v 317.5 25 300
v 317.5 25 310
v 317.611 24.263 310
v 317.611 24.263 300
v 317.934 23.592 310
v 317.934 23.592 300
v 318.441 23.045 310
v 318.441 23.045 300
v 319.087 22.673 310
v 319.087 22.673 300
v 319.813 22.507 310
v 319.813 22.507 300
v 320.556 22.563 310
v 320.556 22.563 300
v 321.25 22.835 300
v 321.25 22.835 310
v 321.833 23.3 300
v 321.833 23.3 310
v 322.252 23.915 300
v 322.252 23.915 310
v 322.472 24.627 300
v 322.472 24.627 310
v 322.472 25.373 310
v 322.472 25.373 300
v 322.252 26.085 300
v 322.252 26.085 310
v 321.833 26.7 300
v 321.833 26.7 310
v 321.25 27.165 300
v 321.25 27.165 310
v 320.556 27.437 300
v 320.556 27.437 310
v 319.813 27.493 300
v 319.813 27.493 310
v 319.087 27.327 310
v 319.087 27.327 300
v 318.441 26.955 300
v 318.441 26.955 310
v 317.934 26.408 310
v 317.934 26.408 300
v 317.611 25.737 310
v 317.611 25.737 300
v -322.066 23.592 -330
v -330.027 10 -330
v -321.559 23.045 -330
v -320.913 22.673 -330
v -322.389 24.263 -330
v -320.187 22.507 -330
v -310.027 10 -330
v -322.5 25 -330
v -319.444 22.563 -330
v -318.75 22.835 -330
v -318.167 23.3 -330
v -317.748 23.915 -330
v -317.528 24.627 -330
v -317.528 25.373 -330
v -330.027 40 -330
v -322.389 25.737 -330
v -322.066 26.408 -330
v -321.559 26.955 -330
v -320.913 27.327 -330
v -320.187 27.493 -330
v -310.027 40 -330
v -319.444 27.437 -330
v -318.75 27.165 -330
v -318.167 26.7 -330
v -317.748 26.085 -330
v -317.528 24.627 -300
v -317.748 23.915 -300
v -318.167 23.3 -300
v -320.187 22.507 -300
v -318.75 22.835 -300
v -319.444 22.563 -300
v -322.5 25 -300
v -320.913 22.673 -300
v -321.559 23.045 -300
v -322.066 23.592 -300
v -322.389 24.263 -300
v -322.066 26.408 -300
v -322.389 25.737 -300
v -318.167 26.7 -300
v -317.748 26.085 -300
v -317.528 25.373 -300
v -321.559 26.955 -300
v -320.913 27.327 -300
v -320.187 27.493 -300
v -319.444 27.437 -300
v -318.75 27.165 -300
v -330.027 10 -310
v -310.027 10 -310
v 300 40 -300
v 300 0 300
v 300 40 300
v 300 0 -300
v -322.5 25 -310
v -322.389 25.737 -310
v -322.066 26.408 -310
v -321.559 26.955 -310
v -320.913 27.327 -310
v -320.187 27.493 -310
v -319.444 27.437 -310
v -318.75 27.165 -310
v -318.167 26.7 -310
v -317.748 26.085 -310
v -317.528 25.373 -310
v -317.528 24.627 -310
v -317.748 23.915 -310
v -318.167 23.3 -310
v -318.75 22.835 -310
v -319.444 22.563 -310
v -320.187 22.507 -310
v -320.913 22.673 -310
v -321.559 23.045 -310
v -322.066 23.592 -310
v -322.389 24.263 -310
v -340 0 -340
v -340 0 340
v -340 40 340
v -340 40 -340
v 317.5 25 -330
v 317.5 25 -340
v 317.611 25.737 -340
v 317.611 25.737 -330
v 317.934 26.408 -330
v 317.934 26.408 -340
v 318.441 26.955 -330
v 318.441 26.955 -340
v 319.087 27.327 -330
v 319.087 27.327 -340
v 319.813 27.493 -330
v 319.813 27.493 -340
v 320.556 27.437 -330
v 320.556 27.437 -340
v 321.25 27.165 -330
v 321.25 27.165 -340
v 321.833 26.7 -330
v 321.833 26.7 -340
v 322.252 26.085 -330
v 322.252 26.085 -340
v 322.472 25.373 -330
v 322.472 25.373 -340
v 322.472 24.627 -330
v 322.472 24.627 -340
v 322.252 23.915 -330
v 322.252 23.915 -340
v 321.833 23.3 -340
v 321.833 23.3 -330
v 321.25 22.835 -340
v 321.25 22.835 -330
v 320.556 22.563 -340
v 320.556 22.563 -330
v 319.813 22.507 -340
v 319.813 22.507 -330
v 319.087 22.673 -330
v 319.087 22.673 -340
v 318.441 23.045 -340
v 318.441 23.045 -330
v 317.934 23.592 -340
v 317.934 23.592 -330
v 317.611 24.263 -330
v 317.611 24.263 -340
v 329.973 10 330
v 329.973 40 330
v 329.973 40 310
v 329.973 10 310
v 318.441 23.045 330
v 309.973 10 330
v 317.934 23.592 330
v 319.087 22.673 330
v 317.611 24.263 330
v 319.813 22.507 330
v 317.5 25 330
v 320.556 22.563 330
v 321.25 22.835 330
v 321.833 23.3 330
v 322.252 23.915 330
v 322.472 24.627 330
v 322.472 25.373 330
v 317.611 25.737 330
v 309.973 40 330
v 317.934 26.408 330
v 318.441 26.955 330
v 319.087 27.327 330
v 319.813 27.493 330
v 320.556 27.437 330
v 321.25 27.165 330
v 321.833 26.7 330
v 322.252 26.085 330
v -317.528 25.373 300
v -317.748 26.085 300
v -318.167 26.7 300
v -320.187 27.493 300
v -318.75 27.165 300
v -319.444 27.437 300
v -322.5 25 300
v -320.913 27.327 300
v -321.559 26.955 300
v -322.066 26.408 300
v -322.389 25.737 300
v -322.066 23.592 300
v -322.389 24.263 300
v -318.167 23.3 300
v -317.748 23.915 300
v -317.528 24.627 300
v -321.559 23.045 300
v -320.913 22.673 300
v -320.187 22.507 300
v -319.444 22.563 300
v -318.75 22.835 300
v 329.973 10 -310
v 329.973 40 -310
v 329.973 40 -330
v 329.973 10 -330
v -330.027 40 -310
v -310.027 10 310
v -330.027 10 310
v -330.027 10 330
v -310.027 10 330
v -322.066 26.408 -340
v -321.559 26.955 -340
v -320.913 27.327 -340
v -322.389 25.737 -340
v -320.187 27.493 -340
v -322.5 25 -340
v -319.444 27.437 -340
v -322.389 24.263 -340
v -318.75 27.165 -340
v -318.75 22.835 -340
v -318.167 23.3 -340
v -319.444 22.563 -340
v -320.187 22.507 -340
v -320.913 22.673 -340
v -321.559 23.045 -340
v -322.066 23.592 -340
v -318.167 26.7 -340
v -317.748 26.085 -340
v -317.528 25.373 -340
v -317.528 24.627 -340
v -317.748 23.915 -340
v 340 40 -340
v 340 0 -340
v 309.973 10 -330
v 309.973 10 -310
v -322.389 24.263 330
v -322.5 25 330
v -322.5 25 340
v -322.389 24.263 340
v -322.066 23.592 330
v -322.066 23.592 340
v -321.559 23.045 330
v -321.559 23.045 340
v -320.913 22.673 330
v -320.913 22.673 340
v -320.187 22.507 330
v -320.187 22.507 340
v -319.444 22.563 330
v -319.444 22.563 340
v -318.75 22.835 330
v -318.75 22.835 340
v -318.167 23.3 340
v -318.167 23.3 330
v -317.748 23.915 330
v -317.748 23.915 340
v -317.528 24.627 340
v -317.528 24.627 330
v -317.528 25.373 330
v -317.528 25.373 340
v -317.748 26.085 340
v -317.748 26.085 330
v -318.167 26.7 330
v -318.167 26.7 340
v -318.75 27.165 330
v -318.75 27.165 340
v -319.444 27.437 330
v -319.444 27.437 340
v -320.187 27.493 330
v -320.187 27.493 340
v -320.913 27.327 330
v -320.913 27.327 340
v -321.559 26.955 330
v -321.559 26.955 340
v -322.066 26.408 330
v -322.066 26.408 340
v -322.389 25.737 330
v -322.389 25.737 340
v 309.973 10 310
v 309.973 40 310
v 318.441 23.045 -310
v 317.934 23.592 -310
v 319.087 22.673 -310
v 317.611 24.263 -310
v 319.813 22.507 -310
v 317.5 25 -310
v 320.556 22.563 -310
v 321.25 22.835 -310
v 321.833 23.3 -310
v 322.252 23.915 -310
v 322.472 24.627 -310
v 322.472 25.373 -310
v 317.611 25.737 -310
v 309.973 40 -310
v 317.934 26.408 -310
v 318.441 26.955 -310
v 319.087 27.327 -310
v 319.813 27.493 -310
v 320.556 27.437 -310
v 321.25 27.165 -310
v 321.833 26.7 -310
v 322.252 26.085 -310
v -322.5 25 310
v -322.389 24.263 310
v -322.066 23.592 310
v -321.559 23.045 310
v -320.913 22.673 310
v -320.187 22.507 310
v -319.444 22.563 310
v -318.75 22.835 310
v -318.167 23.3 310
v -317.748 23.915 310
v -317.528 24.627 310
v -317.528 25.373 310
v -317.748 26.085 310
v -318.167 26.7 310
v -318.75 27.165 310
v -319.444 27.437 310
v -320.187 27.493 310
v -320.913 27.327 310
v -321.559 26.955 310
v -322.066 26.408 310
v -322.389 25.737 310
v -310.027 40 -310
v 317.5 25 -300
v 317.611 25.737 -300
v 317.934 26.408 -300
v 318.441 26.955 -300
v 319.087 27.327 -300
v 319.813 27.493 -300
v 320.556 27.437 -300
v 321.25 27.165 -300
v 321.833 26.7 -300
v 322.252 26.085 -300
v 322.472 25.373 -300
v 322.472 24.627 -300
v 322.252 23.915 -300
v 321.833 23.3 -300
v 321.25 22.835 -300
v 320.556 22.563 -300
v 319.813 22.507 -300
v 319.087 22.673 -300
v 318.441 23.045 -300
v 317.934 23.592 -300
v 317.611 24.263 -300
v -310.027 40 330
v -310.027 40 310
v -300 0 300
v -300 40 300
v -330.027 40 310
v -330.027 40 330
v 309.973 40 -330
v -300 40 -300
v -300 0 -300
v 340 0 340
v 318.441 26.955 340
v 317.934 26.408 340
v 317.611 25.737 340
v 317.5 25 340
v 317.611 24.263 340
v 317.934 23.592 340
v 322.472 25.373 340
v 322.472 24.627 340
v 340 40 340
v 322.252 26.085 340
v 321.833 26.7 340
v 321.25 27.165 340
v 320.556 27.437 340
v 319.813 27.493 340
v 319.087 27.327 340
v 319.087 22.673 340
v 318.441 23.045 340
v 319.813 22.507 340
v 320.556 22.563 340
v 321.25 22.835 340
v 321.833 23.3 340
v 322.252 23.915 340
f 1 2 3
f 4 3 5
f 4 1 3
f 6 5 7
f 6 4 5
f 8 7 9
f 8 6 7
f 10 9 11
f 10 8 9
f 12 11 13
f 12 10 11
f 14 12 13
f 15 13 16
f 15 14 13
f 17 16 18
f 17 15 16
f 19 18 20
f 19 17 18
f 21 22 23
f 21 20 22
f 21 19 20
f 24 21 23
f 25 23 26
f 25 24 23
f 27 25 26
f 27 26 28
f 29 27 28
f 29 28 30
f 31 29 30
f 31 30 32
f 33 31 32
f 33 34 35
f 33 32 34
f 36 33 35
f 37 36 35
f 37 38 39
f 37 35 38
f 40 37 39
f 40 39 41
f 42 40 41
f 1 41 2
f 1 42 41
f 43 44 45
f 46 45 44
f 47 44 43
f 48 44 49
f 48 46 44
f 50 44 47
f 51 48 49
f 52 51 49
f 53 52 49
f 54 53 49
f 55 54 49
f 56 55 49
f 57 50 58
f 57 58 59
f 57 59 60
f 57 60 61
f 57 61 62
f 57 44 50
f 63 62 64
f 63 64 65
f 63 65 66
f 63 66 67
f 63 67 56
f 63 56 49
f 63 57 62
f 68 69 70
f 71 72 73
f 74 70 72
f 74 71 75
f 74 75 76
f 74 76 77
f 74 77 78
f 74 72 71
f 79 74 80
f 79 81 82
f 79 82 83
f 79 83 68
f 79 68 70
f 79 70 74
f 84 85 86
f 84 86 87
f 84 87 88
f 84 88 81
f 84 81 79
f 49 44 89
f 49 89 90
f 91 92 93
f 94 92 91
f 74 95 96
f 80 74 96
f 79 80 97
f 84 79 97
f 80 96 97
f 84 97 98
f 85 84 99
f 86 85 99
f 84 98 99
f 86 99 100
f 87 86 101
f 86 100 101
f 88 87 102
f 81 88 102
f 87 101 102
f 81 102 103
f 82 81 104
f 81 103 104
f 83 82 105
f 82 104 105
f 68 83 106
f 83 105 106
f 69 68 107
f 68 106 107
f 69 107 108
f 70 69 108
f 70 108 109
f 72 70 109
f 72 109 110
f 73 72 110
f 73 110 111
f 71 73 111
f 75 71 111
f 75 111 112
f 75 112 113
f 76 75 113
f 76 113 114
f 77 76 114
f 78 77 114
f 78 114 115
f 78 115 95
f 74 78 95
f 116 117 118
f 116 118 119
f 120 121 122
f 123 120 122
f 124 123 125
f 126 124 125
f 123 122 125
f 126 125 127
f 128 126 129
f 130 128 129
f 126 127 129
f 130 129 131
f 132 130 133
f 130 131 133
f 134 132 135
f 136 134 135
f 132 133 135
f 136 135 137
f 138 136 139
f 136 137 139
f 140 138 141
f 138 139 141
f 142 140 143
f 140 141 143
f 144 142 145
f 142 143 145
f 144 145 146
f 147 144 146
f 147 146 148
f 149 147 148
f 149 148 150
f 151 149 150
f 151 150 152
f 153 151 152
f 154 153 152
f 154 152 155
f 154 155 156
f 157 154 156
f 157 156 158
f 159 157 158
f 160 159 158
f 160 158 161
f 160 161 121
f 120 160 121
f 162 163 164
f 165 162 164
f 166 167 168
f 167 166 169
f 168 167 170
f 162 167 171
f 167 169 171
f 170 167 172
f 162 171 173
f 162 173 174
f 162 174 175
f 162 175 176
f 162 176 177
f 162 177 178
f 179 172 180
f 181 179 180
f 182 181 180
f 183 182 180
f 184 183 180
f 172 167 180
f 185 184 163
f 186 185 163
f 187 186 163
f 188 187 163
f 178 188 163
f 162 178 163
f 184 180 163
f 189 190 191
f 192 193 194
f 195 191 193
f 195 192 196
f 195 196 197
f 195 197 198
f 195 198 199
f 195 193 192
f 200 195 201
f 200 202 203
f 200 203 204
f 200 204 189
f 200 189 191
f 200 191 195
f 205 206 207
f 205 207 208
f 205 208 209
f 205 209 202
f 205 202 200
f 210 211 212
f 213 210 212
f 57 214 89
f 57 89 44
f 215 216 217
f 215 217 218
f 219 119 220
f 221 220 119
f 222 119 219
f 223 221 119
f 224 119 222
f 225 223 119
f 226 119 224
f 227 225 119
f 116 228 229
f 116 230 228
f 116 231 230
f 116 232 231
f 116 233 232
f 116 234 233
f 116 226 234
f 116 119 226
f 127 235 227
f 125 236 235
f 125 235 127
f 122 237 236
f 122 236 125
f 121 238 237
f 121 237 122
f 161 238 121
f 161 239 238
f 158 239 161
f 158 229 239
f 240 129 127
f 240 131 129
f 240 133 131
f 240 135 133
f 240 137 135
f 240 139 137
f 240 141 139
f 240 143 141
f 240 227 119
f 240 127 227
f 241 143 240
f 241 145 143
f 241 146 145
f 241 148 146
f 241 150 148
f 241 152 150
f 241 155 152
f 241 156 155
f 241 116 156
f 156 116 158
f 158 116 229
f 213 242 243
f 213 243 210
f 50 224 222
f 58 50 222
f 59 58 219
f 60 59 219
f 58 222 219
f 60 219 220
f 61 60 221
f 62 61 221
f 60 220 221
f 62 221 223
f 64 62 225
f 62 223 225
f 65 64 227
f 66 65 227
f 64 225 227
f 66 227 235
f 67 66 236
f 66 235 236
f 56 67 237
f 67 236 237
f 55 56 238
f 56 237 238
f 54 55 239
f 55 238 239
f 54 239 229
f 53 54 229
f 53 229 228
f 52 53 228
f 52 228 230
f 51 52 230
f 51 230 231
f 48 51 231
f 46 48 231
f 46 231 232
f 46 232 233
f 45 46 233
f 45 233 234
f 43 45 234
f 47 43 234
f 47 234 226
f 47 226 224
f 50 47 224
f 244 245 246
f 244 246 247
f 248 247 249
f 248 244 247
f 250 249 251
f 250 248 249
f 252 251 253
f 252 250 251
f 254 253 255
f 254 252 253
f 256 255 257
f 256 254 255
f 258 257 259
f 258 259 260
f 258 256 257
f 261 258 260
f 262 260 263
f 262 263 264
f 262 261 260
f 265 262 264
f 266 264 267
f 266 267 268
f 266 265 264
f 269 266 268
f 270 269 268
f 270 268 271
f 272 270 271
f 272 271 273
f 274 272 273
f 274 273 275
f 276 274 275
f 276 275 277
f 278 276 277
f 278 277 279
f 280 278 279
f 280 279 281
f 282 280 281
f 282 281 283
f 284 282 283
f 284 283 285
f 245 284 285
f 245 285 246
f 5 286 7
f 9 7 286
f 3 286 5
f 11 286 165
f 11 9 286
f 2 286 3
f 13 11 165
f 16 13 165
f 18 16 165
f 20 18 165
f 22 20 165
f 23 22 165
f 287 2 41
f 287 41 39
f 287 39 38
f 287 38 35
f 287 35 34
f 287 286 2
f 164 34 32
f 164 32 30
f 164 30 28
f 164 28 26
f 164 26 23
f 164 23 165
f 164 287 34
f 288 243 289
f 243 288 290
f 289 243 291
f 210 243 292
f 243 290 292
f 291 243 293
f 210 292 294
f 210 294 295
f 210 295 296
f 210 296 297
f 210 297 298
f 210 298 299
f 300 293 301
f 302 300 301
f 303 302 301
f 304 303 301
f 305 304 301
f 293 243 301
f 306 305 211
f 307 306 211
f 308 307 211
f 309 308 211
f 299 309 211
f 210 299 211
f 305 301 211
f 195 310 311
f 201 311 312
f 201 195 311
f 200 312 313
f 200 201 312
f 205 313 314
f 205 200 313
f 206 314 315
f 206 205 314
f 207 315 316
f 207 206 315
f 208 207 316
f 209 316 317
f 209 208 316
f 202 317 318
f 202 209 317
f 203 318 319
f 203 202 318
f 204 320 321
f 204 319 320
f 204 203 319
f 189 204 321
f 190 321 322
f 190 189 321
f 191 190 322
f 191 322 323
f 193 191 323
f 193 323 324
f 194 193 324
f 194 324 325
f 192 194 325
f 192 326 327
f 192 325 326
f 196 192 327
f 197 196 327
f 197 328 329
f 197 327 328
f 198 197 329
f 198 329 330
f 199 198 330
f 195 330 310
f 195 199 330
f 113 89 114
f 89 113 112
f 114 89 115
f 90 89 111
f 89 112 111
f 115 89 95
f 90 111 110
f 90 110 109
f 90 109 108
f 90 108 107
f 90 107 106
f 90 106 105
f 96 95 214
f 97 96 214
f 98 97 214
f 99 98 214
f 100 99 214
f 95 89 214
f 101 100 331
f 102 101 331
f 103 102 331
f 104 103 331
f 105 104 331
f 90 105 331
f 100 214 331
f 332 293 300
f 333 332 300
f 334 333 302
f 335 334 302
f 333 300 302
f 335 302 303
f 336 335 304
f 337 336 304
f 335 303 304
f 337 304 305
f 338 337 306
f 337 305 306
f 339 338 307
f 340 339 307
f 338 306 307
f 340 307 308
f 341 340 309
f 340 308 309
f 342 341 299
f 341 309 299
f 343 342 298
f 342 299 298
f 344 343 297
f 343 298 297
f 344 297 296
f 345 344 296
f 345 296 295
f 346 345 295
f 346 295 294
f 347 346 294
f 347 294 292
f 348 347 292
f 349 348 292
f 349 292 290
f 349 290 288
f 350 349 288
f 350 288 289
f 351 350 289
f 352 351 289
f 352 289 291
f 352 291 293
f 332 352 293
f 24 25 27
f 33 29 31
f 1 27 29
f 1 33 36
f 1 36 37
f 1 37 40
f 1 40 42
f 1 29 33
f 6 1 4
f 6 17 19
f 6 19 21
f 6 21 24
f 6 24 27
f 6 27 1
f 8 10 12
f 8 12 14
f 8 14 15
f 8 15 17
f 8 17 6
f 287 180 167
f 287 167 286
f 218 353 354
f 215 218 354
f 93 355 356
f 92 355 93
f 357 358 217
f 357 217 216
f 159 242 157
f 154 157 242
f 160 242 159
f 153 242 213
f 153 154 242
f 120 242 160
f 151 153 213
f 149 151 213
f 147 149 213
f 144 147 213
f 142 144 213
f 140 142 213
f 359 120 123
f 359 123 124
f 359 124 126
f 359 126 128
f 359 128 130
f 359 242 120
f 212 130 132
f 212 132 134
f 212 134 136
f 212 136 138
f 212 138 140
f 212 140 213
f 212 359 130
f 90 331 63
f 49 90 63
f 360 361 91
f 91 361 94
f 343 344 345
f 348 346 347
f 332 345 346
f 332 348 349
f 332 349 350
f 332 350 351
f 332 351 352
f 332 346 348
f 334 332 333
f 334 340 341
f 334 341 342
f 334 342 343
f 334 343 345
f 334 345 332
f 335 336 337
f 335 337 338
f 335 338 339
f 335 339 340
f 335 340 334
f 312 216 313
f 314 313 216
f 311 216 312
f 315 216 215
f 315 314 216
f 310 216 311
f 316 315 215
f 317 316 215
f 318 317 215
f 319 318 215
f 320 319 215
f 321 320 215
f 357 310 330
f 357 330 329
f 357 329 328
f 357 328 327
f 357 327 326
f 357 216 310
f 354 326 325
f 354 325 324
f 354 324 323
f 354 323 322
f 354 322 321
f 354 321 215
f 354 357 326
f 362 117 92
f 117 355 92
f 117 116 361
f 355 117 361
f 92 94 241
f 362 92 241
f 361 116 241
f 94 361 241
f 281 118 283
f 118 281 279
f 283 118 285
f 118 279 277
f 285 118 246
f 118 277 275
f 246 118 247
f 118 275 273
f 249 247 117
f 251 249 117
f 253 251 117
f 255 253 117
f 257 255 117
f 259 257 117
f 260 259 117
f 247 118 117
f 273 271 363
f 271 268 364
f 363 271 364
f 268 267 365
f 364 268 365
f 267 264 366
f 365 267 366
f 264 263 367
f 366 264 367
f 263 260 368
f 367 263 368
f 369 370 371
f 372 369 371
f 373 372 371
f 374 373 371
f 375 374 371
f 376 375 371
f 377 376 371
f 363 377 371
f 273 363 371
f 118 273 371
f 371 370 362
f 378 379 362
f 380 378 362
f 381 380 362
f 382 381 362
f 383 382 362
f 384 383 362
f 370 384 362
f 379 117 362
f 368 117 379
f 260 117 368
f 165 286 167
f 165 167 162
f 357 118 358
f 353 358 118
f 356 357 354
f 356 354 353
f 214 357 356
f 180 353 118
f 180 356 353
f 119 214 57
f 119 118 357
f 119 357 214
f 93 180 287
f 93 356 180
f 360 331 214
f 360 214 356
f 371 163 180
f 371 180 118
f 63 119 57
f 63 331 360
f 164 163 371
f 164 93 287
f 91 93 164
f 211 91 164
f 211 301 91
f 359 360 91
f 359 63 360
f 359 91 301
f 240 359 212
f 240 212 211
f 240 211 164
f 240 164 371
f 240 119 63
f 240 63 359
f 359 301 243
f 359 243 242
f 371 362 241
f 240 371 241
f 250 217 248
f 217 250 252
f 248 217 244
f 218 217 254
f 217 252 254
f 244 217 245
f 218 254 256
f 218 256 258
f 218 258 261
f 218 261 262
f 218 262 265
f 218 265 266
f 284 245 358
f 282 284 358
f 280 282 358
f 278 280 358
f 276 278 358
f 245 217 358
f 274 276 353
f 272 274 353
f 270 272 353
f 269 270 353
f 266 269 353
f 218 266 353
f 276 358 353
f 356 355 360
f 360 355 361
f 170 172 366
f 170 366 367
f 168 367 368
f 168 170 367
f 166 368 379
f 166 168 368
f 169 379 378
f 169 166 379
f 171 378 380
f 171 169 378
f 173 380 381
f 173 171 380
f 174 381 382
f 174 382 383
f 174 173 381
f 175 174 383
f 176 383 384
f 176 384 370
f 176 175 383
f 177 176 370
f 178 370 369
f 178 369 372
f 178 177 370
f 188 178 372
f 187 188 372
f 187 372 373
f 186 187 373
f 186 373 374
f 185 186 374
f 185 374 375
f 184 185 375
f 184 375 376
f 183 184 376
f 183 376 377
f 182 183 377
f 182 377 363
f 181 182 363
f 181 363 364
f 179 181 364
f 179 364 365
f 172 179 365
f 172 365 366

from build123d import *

# Parameters (mm, degrees)
SKETCH1_W           = 680
SKETCH1_H           = 680
SKETCH1_W_2         = 600
SKETCH1_H_2         = 600
BOSS_EXTRUDE1_DEPTH = 40
SKETCH2_W           = 20
SKETCH2_H           = 20
CUT_EXTRUDE2_DEPTH  = 30
SKETCH3_R           = 2.5
CUT_EXTRUDE3_DEPTH  = 40
CUT_EXTRUDE4_START  = -40
SKETCH4_R           = 2.5
CUT_EXTRUDE4_DEPTH  = 40


with BuildPart() as part:
    # Sketch1 → Boss-Extrude1 (new body)
    with BuildSketch(Plane(origin=(0, 0, 0), x_dir=(1, 0, 0), z_dir=(0, 1, 0))):
        Rectangle(SKETCH1_W, SKETCH1_H)
        Rectangle(SKETCH1_W_2, SKETCH1_H_2, mode=Mode.SUBTRACT)
    extrude(amount=BOSS_EXTRUDE1_DEPTH)

    # Sketch2 → Cut-Extrude2 (cut)
    with BuildSketch(Plane(origin=(0, 40, 0), x_dir=(1, 0, 0), z_dir=(0, 1, 0))):
        with Locations((-320.027392849, 320)):
            Rectangle(SKETCH2_W, SKETCH2_H)
        with Locations((319.972607151, 320)):
            Rectangle(SKETCH2_W, SKETCH2_H)
        with Locations((319.972607151, -320)):
            Rectangle(SKETCH2_W, SKETCH2_H)
        with Locations((-320.027392849, -320)):
            Rectangle(SKETCH2_W, SKETCH2_H)
    extrude(amount=-CUT_EXTRUDE2_DEPTH, mode=Mode.SUBTRACT)

    # Sketch3 → Cut-Extrude3 (cut)
    with BuildSketch(Plane(origin=(0, 0, -340), x_dir=(-1, 0, 0), z_dir=(0, 0, -1))):
        with Locations((320, 25)):
            Circle(SKETCH3_R)
        with Locations((-320, 25)):
            Circle(SKETCH3_R)
    extrude(amount=-CUT_EXTRUDE3_DEPTH, mode=Mode.SUBTRACT)

    # Sketch4 → Cut-Extrude4 (cut)
    with BuildSketch(Plane.XY.offset(340).offset(CUT_EXTRUDE4_START)):
        with Locations(Location((-320, 25, 0), (0, 0, 180))):
            Circle(SKETCH4_R)
        with Locations(Location((320, 25, 0), (0, 0, 180))):
            Circle(SKETCH4_R)
    extrude(amount=CUT_EXTRUDE4_DEPTH, mode=Mode.SUBTRACT)


solid = part.part
